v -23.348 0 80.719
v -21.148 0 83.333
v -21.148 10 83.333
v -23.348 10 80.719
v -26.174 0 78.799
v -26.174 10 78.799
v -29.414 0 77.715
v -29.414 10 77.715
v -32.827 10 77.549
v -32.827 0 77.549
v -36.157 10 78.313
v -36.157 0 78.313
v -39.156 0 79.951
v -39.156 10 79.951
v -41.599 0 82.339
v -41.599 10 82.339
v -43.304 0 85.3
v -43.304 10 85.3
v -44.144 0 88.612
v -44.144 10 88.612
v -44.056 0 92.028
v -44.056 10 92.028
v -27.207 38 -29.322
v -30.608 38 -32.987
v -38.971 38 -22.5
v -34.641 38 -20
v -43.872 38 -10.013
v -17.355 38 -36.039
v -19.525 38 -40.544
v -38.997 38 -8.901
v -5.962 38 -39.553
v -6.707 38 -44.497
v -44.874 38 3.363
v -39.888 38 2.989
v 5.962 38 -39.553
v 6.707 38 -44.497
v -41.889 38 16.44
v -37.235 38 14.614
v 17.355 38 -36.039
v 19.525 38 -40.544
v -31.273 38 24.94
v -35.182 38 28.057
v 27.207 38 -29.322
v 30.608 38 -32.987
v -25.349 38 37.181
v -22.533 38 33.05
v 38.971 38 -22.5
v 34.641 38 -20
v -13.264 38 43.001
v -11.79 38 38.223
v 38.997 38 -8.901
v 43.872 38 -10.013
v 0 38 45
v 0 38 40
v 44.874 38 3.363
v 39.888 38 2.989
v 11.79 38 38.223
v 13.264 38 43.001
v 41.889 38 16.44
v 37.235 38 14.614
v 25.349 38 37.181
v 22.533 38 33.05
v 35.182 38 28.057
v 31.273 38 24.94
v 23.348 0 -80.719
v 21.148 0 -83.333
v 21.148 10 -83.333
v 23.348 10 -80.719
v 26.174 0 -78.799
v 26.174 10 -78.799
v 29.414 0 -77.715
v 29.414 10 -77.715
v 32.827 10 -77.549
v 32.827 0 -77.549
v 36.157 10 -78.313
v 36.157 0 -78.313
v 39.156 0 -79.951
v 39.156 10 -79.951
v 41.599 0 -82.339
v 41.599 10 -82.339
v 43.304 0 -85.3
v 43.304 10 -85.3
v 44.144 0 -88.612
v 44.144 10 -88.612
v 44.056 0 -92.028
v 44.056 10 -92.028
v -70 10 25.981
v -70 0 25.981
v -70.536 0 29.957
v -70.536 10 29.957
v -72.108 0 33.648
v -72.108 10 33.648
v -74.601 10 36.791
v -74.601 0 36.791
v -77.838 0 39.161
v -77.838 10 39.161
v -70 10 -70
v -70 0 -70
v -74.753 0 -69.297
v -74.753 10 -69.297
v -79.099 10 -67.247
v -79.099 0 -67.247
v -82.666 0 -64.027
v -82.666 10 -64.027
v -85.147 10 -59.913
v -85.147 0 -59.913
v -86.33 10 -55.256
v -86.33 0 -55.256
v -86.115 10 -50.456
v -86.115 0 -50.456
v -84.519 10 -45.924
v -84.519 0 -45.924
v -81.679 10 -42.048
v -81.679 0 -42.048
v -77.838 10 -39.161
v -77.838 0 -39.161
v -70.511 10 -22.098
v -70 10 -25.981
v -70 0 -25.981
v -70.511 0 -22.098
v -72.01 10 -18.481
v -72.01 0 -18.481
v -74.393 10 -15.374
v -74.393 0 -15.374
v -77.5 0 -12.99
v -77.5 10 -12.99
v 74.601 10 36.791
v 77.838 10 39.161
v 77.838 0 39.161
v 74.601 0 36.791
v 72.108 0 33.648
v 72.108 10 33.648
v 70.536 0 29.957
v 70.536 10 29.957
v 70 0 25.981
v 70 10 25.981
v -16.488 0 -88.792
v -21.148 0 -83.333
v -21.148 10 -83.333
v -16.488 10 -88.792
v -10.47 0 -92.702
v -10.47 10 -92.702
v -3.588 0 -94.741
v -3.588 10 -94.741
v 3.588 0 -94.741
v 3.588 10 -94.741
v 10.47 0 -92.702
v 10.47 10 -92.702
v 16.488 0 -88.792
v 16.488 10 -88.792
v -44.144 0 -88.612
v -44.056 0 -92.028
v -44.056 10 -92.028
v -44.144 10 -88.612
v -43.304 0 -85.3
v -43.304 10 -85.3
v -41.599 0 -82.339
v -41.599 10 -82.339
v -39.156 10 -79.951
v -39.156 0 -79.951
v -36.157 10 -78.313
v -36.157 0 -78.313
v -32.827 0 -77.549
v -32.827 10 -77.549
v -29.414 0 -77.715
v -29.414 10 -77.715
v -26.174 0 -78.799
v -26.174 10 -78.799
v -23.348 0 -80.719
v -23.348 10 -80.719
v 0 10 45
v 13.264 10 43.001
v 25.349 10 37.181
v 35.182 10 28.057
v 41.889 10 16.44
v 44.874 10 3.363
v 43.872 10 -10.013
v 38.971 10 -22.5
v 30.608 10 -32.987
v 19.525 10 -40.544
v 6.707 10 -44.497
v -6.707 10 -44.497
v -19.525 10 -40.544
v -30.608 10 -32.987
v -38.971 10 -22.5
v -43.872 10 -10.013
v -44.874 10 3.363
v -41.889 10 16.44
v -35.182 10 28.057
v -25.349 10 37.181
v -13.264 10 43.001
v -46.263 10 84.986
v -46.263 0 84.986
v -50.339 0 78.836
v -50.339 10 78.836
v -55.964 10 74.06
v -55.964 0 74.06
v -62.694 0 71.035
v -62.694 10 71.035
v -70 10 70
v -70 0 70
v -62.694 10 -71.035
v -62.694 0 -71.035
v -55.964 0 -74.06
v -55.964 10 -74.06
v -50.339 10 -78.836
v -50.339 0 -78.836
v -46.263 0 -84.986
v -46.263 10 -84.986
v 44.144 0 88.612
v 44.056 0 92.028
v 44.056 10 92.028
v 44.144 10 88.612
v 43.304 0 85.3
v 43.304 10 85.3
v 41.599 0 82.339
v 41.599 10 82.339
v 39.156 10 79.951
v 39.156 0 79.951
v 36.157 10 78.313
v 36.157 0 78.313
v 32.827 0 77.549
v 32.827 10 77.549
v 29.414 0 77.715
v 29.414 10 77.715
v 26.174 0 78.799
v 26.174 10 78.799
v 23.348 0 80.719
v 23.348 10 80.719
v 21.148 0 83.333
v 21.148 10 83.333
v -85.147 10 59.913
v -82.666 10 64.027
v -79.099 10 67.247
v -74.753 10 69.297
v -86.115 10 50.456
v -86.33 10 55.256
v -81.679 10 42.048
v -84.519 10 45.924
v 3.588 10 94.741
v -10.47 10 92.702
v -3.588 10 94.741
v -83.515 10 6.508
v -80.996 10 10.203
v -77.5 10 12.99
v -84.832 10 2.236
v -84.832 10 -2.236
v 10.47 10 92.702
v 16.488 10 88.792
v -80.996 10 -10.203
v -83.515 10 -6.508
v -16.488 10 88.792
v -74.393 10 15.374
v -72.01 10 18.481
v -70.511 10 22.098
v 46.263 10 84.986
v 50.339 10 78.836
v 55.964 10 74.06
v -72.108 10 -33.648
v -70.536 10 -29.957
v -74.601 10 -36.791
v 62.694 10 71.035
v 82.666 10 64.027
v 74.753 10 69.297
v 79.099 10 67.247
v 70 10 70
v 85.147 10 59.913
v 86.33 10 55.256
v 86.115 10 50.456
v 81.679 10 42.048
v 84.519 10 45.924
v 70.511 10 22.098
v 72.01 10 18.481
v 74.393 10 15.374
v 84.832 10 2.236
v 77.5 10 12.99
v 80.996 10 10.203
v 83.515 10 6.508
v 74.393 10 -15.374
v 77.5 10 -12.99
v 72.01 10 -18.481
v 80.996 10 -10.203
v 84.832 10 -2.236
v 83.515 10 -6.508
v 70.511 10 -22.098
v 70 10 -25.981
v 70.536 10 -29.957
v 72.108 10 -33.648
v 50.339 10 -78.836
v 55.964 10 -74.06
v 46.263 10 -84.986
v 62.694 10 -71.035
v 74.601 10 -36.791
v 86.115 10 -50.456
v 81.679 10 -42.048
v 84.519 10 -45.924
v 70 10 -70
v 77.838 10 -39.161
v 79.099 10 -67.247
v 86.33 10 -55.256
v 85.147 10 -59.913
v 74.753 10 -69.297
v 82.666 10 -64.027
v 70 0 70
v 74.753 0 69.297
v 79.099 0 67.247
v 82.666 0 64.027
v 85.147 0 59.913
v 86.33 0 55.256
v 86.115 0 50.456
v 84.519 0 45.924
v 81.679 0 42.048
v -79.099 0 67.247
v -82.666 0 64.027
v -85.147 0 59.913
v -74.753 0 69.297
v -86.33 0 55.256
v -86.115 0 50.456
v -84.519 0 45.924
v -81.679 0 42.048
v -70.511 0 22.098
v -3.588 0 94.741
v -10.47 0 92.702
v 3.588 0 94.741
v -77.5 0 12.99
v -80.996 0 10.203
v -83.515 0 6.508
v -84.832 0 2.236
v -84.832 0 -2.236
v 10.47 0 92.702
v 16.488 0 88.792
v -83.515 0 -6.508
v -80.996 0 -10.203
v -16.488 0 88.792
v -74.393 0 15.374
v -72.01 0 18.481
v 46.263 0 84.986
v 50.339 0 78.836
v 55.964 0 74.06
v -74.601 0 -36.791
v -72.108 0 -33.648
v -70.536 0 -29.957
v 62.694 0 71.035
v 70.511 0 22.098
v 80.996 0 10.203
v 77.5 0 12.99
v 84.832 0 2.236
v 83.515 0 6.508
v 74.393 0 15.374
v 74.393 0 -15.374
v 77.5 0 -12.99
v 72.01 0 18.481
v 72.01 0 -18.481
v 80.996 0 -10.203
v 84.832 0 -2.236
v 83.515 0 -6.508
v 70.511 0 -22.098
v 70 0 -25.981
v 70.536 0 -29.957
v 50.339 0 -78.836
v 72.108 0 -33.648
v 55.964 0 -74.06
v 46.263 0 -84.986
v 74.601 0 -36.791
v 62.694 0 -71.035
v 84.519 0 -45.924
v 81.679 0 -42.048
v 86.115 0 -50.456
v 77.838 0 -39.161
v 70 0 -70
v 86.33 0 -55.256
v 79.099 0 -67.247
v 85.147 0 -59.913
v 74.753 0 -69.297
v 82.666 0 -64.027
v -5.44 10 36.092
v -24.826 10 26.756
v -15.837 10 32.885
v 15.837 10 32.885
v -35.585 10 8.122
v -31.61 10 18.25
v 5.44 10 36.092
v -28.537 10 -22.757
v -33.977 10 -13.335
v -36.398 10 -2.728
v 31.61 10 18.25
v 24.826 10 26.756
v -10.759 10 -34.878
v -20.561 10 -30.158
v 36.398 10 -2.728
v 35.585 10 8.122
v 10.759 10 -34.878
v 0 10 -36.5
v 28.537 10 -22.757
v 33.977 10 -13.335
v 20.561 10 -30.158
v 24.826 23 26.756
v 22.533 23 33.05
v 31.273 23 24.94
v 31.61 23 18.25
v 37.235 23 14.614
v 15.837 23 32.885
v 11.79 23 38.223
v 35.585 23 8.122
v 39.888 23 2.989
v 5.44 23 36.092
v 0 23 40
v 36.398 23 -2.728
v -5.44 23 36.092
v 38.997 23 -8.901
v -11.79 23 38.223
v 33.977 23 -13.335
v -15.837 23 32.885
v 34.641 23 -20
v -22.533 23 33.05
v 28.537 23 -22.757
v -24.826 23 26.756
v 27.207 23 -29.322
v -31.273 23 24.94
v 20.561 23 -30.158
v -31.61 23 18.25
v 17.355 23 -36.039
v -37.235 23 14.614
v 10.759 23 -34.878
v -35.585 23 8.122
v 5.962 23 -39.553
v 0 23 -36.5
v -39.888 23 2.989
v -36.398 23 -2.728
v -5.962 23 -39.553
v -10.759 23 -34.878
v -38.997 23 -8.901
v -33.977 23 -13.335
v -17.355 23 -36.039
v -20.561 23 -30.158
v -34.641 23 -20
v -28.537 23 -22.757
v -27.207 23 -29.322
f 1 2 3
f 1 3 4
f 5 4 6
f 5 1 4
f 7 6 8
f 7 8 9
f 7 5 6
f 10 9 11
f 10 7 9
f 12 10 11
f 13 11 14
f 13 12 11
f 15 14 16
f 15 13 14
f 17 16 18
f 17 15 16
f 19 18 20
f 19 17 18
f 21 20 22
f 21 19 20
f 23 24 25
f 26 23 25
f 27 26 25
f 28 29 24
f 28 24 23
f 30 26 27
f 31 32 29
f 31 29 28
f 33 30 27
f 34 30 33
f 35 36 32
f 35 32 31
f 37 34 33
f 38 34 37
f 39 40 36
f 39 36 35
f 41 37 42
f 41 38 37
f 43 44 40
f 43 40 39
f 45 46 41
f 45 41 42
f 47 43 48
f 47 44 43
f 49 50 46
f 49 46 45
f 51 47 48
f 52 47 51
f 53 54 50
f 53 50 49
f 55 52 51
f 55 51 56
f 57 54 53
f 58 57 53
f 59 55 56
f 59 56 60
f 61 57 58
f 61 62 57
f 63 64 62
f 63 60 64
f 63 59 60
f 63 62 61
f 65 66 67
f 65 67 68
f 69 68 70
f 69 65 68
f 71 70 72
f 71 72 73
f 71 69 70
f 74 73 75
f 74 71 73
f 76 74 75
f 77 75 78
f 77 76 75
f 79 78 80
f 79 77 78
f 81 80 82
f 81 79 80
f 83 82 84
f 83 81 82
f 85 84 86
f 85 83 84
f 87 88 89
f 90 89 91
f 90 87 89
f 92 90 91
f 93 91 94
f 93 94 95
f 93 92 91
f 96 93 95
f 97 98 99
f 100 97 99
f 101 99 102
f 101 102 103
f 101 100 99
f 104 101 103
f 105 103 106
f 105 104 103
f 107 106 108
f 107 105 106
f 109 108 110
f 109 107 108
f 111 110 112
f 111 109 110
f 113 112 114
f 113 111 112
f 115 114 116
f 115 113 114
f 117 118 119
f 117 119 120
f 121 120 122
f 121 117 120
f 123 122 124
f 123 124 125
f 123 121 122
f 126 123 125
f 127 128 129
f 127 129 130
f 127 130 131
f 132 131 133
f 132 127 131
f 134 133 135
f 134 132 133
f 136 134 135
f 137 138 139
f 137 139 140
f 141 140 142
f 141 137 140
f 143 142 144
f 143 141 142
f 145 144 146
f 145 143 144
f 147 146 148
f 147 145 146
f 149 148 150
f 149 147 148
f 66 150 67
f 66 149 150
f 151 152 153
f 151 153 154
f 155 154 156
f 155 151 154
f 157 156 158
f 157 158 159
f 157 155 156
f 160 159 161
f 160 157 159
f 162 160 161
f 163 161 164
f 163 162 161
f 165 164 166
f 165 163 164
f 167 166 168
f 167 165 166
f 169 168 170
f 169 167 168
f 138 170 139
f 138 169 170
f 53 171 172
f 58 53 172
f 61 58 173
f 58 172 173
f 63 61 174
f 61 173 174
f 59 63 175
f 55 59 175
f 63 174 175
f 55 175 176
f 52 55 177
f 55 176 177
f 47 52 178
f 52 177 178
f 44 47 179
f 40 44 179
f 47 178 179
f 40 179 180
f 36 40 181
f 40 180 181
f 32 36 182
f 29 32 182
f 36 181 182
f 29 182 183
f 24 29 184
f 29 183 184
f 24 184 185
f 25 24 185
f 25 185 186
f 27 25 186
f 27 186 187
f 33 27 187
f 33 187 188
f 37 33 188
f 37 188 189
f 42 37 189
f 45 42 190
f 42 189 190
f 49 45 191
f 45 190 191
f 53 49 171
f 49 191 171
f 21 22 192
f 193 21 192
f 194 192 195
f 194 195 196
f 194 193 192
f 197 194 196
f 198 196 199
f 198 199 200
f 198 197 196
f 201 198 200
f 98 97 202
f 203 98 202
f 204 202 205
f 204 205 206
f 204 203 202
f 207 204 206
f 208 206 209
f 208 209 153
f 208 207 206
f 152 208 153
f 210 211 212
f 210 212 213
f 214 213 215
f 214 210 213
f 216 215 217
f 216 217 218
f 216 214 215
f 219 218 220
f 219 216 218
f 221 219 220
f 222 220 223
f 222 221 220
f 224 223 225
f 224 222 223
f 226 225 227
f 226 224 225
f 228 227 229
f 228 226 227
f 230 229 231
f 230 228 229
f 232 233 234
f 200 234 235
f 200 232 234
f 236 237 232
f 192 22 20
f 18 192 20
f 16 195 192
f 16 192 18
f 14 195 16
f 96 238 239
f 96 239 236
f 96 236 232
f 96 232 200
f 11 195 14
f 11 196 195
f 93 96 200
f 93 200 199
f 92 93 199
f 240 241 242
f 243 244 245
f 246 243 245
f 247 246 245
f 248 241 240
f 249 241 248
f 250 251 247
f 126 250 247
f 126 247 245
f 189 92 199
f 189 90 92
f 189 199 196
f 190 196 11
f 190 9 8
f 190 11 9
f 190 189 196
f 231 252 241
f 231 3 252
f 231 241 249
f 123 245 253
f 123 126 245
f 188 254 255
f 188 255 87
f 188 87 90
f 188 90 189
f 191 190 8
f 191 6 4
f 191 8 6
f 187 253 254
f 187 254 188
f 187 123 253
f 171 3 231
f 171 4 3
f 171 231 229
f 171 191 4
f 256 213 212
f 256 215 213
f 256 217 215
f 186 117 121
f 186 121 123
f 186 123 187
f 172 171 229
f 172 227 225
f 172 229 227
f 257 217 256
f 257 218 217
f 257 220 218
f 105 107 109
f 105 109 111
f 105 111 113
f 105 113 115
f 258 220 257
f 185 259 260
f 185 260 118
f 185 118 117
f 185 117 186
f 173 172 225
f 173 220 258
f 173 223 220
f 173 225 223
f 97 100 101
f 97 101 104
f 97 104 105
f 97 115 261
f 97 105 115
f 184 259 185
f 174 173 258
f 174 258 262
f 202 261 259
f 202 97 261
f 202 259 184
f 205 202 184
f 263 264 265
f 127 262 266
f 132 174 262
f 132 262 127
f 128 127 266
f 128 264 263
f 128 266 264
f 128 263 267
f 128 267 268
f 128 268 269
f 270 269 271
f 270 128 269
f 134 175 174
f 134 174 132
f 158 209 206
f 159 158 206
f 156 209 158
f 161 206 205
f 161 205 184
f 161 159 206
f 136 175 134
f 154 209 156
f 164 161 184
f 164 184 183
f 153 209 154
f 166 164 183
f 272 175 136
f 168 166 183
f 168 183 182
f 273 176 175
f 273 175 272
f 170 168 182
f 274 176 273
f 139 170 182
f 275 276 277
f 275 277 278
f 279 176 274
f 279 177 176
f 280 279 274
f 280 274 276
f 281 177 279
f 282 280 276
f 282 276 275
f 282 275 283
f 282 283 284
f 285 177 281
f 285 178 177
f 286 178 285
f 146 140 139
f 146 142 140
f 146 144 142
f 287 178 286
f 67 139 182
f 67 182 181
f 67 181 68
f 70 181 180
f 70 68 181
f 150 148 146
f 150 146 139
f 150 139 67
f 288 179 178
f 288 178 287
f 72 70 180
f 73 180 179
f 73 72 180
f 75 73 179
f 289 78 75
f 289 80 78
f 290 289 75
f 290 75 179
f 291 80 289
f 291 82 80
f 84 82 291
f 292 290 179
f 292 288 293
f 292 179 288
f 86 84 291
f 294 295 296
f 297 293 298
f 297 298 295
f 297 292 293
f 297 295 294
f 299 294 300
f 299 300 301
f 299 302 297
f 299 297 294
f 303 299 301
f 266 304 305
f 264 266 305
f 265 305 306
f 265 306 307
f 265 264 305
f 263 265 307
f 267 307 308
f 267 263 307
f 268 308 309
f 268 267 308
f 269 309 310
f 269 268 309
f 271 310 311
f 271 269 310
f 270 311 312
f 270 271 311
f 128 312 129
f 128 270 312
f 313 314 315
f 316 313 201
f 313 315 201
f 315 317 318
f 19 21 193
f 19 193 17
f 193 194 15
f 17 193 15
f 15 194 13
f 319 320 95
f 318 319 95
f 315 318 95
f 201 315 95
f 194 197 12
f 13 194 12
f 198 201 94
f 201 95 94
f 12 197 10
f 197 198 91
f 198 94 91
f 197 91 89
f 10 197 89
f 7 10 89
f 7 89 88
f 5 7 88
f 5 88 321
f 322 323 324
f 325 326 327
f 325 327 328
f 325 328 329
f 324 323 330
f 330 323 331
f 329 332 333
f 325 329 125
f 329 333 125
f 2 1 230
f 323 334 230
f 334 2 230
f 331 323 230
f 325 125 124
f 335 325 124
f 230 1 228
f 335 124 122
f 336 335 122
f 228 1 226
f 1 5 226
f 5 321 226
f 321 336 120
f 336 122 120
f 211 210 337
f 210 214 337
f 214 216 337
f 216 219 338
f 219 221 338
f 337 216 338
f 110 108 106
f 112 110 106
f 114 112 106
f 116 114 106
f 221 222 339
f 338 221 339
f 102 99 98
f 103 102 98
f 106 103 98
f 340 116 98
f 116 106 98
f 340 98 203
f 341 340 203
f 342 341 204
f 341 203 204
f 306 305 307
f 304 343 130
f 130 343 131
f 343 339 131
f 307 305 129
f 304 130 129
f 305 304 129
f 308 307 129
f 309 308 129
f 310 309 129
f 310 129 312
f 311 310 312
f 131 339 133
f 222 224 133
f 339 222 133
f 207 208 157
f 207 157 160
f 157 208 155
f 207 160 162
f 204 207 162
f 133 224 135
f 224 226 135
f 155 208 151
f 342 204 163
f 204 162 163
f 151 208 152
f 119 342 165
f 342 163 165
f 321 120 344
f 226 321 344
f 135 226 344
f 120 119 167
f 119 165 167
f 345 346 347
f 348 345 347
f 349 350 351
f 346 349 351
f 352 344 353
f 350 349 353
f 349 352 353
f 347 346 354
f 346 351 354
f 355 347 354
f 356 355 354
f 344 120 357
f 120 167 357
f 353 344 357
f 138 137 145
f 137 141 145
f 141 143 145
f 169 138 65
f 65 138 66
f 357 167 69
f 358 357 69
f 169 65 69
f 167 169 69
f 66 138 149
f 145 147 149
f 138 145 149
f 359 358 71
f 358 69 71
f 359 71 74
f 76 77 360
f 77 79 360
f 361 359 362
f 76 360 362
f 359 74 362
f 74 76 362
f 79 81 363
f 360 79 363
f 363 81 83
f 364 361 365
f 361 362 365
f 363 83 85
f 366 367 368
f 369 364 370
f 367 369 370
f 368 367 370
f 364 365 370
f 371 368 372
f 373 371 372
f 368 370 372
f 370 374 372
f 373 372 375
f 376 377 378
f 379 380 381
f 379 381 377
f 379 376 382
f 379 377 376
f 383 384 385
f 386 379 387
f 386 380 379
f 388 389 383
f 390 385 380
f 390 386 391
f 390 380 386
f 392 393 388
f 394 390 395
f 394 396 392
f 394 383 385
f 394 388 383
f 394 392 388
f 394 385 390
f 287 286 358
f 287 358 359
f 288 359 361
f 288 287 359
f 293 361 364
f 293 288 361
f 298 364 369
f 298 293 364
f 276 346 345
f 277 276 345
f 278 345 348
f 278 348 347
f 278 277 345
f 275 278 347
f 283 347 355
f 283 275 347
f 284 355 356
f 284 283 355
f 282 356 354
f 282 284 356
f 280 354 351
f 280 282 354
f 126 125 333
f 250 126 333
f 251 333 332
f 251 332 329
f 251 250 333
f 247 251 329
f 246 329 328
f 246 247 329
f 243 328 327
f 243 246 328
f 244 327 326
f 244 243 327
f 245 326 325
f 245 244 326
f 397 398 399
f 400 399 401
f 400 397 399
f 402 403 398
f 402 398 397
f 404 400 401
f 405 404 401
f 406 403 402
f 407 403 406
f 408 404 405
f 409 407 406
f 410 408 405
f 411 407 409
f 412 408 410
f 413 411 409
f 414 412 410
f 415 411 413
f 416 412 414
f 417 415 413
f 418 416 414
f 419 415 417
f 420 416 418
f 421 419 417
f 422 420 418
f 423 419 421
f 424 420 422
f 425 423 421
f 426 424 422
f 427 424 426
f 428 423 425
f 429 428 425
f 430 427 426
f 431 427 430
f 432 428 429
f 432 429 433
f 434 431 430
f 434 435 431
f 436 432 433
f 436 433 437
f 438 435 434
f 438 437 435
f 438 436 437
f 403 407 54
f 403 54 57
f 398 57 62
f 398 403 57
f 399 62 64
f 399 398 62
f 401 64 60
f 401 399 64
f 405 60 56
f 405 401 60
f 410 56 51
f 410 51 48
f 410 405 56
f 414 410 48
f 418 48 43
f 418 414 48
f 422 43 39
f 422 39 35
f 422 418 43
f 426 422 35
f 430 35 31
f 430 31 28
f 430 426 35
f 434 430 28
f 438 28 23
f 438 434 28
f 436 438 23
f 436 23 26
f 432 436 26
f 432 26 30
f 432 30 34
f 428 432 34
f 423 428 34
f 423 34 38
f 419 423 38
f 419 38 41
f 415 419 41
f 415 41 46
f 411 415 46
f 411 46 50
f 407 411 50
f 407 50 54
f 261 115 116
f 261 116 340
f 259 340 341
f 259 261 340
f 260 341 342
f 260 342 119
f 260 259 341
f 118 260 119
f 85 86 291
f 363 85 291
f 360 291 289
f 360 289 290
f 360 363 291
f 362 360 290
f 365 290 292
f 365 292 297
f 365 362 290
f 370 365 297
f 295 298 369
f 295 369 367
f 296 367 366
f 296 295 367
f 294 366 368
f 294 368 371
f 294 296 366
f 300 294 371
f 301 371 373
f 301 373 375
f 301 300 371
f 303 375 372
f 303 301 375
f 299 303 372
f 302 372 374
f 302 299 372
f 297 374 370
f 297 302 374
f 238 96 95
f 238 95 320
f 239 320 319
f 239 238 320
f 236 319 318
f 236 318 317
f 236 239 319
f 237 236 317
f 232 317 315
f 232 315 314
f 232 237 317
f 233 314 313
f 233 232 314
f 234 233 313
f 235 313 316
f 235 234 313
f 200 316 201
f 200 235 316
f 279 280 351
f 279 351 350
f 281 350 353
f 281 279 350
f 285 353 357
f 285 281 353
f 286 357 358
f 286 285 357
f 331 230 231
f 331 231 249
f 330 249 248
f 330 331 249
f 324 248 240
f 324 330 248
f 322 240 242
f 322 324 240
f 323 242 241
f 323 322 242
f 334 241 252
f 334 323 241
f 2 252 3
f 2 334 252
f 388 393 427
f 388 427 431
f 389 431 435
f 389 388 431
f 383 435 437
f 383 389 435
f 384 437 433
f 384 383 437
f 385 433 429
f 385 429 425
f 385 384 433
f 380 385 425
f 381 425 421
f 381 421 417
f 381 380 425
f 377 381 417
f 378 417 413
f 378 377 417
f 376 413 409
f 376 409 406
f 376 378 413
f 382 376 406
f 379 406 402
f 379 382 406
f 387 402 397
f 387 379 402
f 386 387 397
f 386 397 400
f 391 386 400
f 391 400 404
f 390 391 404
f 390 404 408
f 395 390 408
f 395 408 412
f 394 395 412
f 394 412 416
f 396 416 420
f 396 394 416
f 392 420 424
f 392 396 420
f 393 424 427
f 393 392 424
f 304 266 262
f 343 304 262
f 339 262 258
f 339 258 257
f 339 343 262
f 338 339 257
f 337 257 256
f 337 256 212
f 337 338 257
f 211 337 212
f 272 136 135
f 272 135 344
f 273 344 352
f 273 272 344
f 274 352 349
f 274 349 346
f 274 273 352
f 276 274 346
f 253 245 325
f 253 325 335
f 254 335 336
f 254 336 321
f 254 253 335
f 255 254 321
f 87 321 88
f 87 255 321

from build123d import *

# Parameters (mm, degrees)
SALIENTE_EXTRUIR1_DEPTH = 10
SALIENTE_EXTRUIR2_DEPTH = 10
CROQUIS3_R              = 40
CROQUIS3_R_2            = 36.5
SALIENTE_EXTRUIR3_DEPTH = 13
CROQUIS4_R              = 45
CROQUIS4_R_2            = 40
SALIENTE_EXTRUIR4_DEPTH = 28


with BuildPart() as part:
    # Croquis1 → Saliente-Extruir1 (new body)
    with BuildSketch(Plane(origin=(0, 0, 0), x_dir=(1, 0, 0), z_dir=(0, 1, 0))):
        with BuildLine():
            Line((-70, -70), (-70, 70))
            ThreePointArc((-70, 70), (-52.983030462, 76.249658661), (-44.055908755, 92.027554074))
            ThreePointArc((-44.055908755, 92.027554074), (-36.156795126, 78.313355526), (-21.147629234, 83.333333333))
            ThreePointArc((-21.147629234, 83.333333333), (0, 95), (21.147629234, 83.333333333))
            ThreePointArc((21.147629234, 83.333333333), (36.156795126, 78.313355526), (44.055908755, 92.027554074))
            ThreePointArc((44.055908755, 92.027554074), (52.983030462, 76.249658661), (70, 70))
            Line((70, 70), (70, -70))
            ThreePointArc((70, -70), (52.983030462, -76.249658661), (44.055908755, -92.027554074))
            ThreePointArc((44.055908755, -92.027554074), (36.156795126, -78.313355526), (21.147629234, -83.333333333))
            ThreePointArc((21.147629234, -83.333333333), (0, -95), (-21.147629234, -83.333333333))
            ThreePointArc((-21.147629234, -83.333333333), (-36.156795126, -78.313355526), (-44.055908755, -92.027554074))
            ThreePointArc((-44.055908755, -92.027554074), (-52.983030462, -76.249658661), (-70, -70))
        make_face()
    extrude(amount=SALIENTE_EXTRUIR1_DEPTH)

    # Croquis2 → Saliente-Extruir2 (add)
    with BuildSketch(Plane(origin=(0, 10, 0), x_dir=(1, 0, 0), z_dir=(0, 1, 0))):
        with BuildLine():
            Line((-70, 25.98076189), (-70, 70))
            ThreePointArc((-70, 70), (-85.909969357, 57.627811916), (-77.837993487, 39.160506523))
            ThreePointArc((-77.837993487, 39.160506523), (-72.107558403, 33.647896498), (-70, 25.98076189))
        make_face()
        with BuildLine():
            ThreePointArc((77.837993487, 39.160506523), (85.909969357, 57.627811916), (70, 70))
            Line((70, 70), (70, 25.98076213))
            ThreePointArc((70, 25.98076213), (72.107558465, 33.647896602), (77.837993487, 39.160506523))
        make_face()
        with BuildLine():
            ThreePointArc((77.5, 12.990381057), (72.009618939, 18.480762121), (70, 25.98076213))
            Line((70, 25.98076213), (70, -25.98076213))
            ThreePointArc((70, -25.98076213), (72.009618939, -18.480762121), (77.5, -12.990381057))
            ThreePointArc((77.5, -12.990381057), (85, 0), (77.5, 12.990381057))
        make_face()
        with BuildLine():
            Line((-70, -25.980762199), (-70, 25.98076189))
            ThreePointArc((-70, 25.98076189), (-72.009618999, 18.480762017), (-77.5, 12.990381057))
            ThreePointArc((-77.5, 12.990381057), (-85, 0), (-77.5, -12.990381057))
            ThreePointArc((-77.5, -12.990381057), (-72.009618922, -18.480762151), (-70, -25.980762199))
        make_face()
        with BuildLine():
            Line((-70, -70), (-70, -25.980762199))
            ThreePointArc((-70, -25.980762199), (-72.107558482, -33.647896631), (-77.837993487, -39.160506523))
            ThreePointArc((-77.837993487, -39.160506523), (-85.909969357, -57.627811916), (-70, -70))
        make_face()
        with BuildLine():
            ThreePointArc((77.837993487, -39.160506523), (72.107558465, -33.647896602), (70, -25.98076213))
            Line((70, -25.98076213), (70, -70))
            ThreePointArc((70, -70), (85.909969357, -57.627811916), (77.837993487, -39.160506523))
        make_face()
    extrude(amount=-SALIENTE_EXTRUIR2_DEPTH)

    # Croquis3 → Saliente-Extruir3 (add)
    with BuildSketch(Plane(origin=(0, 10, 0), x_dir=(1, 0, 0), z_dir=(0, 1, 0))):
        with Locations(Location((0, 0, 0), (0, 0, 90))):
            Circle(CROQUIS3_R)
        with Locations(Location((0, 0, 0), (0, 0, 90))):
            Circle(CROQUIS3_R_2, mode=Mode.SUBTRACT)
    extrude(amount=SALIENTE_EXTRUIR3_DEPTH)

    # Croquis4 → Saliente-Extruir4 (add)
    with BuildSketch(Plane(origin=(0, 10, 0), x_dir=(1, 0, 0), z_dir=(0, 1, 0))):
        with Locations(Location((0, 0, 0), (0, 0, 270))):
            Circle(CROQUIS4_R)
        with Locations(Location((0, 0, 0), (0, 0, 270))):
            Circle(CROQUIS4_R_2, mode=Mode.SUBTRACT)
    extrude(amount=SALIENTE_EXTRUIR4_DEPTH)


solid = part.part
